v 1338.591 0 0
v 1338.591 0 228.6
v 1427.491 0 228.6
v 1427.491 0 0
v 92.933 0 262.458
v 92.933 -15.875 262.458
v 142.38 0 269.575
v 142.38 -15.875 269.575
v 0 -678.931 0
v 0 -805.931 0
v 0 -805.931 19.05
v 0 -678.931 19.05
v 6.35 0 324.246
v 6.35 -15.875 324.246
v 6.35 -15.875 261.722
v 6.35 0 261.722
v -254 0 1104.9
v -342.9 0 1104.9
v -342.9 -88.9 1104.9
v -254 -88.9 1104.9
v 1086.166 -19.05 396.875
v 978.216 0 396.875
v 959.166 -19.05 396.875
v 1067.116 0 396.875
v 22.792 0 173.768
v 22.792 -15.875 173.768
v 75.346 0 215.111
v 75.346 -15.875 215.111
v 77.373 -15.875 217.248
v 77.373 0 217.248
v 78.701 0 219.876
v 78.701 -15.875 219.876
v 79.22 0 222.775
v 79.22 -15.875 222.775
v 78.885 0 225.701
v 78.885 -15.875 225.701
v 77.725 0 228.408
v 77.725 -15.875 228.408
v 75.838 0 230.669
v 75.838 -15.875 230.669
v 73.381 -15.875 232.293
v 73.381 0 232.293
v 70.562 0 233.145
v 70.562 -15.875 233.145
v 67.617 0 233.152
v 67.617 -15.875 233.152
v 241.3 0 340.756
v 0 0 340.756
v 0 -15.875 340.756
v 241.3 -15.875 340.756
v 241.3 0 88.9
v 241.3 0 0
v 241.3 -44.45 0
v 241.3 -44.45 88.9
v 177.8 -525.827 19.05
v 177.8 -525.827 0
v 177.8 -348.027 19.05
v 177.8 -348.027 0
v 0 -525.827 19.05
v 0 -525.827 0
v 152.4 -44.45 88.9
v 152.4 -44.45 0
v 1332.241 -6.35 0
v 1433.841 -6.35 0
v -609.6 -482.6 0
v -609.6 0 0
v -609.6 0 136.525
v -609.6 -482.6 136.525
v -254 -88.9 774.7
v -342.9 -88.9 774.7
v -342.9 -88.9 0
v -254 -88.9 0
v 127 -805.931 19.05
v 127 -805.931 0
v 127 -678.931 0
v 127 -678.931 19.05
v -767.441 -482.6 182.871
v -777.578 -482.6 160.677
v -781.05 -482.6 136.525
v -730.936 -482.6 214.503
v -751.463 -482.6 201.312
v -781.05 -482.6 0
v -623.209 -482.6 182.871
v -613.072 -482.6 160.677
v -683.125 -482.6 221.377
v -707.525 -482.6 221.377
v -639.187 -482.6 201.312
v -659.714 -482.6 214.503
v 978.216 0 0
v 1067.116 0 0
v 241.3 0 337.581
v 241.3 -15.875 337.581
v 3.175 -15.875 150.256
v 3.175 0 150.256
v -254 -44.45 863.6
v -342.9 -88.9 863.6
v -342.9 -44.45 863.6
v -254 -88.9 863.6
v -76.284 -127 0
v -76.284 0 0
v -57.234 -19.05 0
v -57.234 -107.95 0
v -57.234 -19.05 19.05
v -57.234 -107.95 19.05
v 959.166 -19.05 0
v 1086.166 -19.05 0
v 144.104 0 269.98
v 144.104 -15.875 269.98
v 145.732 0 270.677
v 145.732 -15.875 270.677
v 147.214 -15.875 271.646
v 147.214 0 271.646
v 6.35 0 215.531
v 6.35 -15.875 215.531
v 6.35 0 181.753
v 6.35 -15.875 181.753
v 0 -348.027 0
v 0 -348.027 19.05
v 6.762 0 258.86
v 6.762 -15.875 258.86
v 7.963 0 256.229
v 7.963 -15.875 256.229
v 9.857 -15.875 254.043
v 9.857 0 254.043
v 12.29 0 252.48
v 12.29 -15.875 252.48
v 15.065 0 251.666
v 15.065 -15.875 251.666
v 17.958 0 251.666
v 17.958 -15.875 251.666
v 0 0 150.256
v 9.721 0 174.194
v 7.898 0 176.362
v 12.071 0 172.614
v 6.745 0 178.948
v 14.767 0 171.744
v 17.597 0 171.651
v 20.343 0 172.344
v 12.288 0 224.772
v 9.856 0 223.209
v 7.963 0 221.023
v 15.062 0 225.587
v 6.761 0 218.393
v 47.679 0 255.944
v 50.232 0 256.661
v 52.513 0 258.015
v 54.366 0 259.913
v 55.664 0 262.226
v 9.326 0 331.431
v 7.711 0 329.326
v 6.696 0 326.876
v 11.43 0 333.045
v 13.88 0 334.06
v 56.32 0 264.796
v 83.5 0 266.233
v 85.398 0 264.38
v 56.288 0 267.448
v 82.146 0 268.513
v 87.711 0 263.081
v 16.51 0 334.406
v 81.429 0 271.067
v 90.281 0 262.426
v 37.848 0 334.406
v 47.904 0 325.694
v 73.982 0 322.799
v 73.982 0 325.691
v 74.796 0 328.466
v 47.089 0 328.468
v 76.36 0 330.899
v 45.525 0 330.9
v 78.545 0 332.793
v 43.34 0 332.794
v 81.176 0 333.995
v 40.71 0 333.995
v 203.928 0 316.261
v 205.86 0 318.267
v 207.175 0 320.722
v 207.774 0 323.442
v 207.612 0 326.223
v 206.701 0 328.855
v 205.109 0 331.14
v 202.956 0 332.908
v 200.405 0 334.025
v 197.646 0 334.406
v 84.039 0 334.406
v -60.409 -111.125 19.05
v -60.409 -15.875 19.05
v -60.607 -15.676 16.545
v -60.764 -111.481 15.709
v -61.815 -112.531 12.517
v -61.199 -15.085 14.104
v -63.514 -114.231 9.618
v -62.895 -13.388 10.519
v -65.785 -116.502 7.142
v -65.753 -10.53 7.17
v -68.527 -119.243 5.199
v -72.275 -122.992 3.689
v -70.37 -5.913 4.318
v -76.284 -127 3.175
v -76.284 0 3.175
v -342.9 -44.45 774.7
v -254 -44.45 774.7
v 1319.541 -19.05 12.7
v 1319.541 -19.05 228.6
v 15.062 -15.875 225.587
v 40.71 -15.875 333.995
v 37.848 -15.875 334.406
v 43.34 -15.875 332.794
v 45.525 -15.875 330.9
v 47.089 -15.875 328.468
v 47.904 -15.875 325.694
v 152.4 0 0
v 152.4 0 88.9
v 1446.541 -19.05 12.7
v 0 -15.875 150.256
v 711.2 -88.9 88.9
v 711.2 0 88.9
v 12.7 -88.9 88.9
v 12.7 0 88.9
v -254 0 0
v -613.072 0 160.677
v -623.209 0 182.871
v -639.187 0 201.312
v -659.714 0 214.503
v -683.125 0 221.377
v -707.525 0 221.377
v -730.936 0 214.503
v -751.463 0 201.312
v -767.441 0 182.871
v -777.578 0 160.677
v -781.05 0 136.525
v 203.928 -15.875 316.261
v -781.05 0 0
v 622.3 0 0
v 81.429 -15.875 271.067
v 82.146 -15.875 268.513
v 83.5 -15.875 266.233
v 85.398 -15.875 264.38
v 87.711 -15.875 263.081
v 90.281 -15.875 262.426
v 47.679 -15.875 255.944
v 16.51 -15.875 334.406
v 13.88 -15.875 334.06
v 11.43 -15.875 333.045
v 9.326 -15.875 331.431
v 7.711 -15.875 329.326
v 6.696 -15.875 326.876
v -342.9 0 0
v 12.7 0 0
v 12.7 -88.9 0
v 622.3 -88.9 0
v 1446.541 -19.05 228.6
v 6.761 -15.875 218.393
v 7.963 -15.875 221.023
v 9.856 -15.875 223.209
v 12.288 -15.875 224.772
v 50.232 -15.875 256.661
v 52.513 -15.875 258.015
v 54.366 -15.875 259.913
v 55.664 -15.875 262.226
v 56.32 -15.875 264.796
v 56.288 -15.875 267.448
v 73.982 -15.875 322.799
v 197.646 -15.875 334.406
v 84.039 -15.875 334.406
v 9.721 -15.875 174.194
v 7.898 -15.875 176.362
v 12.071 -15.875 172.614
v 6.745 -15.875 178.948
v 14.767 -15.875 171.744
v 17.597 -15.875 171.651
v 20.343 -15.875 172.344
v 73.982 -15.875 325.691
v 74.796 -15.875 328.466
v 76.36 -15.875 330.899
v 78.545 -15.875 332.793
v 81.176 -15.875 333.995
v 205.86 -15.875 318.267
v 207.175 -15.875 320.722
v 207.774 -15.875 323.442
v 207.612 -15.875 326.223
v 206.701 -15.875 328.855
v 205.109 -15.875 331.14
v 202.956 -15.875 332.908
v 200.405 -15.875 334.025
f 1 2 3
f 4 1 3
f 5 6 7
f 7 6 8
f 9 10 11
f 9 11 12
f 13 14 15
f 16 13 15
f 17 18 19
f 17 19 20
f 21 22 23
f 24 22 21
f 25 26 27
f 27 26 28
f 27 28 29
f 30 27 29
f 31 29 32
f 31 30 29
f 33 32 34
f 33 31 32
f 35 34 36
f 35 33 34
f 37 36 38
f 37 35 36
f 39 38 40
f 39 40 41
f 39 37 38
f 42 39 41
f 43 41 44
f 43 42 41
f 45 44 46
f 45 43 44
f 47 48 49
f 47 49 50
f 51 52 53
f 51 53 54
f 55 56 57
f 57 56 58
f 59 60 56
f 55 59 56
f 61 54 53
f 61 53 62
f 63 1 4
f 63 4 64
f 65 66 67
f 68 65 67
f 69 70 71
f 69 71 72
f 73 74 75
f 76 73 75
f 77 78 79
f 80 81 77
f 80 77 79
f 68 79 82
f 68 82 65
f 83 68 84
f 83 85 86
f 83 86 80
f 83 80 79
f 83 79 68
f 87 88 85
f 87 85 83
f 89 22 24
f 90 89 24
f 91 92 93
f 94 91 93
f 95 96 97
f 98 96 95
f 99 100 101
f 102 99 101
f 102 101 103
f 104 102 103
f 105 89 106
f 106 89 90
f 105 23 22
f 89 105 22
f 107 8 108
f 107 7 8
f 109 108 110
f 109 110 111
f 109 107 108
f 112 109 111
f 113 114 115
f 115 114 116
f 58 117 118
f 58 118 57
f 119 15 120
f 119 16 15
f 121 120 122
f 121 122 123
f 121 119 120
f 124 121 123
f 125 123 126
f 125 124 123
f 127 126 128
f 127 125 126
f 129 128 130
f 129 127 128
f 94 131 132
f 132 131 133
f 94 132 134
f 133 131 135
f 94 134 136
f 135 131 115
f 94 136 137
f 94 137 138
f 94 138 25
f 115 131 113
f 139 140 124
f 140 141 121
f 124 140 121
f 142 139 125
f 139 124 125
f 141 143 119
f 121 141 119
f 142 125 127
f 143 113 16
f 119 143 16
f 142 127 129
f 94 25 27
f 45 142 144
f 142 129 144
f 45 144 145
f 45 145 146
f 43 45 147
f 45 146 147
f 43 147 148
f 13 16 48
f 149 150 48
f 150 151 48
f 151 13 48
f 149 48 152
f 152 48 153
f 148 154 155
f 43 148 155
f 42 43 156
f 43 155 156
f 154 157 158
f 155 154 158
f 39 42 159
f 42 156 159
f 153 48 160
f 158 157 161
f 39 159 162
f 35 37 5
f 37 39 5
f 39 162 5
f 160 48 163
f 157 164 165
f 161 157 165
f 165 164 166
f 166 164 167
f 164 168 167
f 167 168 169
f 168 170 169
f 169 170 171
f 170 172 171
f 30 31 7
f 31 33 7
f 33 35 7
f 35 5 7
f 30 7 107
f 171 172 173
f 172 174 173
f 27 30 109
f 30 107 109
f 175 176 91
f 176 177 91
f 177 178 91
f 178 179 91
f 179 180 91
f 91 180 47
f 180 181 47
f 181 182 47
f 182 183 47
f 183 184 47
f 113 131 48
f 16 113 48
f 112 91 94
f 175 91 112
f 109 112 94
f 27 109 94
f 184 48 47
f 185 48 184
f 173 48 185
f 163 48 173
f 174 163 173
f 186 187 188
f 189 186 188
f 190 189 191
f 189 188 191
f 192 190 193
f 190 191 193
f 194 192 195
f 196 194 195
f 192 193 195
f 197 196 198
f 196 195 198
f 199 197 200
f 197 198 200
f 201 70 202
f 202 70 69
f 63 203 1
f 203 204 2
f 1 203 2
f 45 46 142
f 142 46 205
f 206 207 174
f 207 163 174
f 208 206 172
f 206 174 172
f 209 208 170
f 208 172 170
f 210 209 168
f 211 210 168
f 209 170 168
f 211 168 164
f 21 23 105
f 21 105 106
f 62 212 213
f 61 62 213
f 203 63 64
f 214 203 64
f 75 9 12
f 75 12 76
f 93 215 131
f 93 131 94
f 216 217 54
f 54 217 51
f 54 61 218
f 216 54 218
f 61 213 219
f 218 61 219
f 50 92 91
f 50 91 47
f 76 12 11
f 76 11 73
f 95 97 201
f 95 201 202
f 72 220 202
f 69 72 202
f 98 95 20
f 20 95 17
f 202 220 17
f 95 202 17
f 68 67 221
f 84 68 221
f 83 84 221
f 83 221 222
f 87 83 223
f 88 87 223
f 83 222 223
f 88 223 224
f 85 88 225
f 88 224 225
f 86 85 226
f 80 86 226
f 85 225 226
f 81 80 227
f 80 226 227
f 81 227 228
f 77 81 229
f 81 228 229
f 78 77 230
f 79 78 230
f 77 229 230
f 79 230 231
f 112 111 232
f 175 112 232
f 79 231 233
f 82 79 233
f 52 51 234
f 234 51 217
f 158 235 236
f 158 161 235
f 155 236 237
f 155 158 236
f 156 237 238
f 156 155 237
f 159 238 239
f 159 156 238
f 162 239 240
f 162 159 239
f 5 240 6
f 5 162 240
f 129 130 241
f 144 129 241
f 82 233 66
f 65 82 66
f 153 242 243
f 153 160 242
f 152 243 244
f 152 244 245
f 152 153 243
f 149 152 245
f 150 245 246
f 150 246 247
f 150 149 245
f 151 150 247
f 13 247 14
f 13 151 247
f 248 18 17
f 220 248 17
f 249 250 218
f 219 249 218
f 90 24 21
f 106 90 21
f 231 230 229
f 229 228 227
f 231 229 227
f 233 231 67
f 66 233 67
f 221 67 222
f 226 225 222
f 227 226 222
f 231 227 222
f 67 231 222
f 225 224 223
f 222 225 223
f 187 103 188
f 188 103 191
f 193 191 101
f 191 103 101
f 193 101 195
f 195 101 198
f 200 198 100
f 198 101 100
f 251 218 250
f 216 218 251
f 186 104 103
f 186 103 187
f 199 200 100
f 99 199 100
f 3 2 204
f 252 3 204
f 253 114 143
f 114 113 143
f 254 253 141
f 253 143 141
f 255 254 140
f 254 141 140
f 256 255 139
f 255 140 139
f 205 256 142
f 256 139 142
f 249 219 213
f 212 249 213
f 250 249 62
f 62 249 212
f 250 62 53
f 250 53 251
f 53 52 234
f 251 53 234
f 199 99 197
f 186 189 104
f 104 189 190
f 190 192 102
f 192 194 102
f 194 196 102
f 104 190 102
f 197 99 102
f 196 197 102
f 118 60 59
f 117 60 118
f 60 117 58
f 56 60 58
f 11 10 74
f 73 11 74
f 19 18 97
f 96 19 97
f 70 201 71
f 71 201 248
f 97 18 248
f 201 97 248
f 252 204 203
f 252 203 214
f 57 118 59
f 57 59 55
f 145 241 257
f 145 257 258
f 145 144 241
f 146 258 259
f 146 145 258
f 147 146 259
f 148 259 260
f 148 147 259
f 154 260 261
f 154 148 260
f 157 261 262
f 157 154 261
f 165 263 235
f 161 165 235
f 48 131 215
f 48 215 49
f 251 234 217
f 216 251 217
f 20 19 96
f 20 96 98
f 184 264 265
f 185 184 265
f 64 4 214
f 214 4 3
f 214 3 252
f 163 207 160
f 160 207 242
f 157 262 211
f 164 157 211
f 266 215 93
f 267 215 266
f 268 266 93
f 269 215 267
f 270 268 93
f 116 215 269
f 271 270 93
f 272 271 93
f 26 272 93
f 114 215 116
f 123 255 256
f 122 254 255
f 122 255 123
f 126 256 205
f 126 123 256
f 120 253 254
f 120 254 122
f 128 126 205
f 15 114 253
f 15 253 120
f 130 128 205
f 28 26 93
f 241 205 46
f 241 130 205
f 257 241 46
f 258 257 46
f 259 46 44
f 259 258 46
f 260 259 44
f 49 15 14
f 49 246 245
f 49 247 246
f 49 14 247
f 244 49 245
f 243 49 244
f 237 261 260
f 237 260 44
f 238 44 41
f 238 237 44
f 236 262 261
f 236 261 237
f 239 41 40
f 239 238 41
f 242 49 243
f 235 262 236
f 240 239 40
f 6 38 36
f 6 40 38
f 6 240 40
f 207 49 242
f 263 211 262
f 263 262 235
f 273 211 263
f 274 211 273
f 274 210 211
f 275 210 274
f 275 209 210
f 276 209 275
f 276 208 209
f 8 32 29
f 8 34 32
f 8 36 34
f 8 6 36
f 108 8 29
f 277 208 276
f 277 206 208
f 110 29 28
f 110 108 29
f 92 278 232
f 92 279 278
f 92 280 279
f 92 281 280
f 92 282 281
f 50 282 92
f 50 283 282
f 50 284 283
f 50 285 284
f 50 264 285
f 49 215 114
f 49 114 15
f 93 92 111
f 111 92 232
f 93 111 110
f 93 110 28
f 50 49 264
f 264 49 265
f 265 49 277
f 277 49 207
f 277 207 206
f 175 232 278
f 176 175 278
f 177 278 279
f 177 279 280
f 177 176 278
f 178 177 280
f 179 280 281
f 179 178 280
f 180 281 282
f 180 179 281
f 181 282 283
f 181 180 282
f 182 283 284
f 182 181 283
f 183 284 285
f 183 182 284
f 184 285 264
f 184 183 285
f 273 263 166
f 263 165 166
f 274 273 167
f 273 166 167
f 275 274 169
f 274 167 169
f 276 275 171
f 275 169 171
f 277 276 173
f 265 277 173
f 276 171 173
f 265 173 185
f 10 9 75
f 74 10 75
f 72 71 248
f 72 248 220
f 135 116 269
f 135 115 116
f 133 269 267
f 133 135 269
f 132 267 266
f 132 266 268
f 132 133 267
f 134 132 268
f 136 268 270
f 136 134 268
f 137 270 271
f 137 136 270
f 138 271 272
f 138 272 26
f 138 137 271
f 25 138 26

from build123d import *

# Parameters (mm, degrees)
F1_DEPTH  = 482.6
F3_DEPTH  = 88.9
F4_W      = 88.9
F4_H      = 88.9
F5_DEPTH  = 44.45
F7_DEPTH  = 88.9
F8_W      = 88.9
F8_H      = 88.9
F9_DEPTH  = 44.45
F11_DEPTH = 88.9
F12_W     = 88.9
F12_H     = 95.25
F13_DEPTH = 88.9
F15_DEPTH = 88.9
F17_W     = 127
F17_H     = 396.875
F18_DEPTH = 19.05
F20_DEPTH = 396.876
F21_W     = 127
F21_H     = 228.6
F22_DEPTH = 19.05
F24_DEPTH = 228.601
F26_DEPTH = 127
F28_DEPTH = 1104.901
F29_W     = 177.8
F29_H     = 177.8
F30_DEPTH = 19.05
F31_W     = 127
F31_H     = 127
F32_DEPTH = 19.05
F33_W     = 241.3
F33_H     = 190.5
F34_DEPTH = 15.875
F36_DEPTH = 15.876
F38_DEPTH = 15.876
F39_R     = 10.16
F40_SIZE  = 12.7


with BuildPart() as f1:
    # F0 (on Front) → F1 (new body)
    with BuildSketch(Plane.XZ):
        with BuildLine():
            Line((-781.05, 136.525), (-781.05, 0))
            Line((-781.05, 0), (-609.6, 0))
            Line((-609.6, 0), (-609.6, 136.525))
            ThreePointArc((-609.6, 136.525), (-695.325, 222.25), (-781.05, 136.525))
        make_face()
    extrude(amount=F1_DEPTH)


with BuildPart() as f3:
    # F2 (on Front) → F3 (new body)
    with BuildSketch(Plane.XZ):
        Polygon((-342.9, 1104.9), (-342.9, 0), (-254, 0), (-254, 1193.8), align=None)
    extrude(amount=F3_DEPTH)

    # F4 (on face) → F5 (cut)
    with BuildSketch(Plane.XZ.offset(88.9)):
        with Locations((-298.45, 819.15)):
            Rectangle(F4_W, F4_H)
    extrude(amount=-F5_DEPTH, mode=Mode.SUBTRACT)

    # F12 (on face) → F13 (cut)
    with BuildSketch(Plane.XZ.offset(88.9)):
        with Locations((-298.45, 1152.525)):
            Rectangle(F12_W, F12_H)
    extrude(amount=-F13_DEPTH, mode=Mode.SUBTRACT)


with BuildPart() as f7:
    # F6 (on Front) → F7 (new body)
    with BuildSketch(Plane.XZ):
        Polygon((12.7, 88.9), (-76.2, 0), (622.3, 0), (711.2, 88.9), align=None)
    extrude(amount=F7_DEPTH)

    # F8 (on face) → F9 (cut)
    with BuildSketch(Plane(origin=(0, 0, 0), x_dir=(-1, 0, 0), z_dir=(0, 1, 0))):
        with Locations((-196.85, 44.45)):
            Rectangle(F8_W, F8_H)
    extrude(amount=-F9_DEPTH, mode=Mode.SUBTRACT)

    # F14 (on face) → F15 (cut)
    with BuildSketch(Plane.XZ.offset(88.9)):
        Polygon((-76.2, 0), (12.7, 88.9), (-82.55, 88.9), (-82.55, 0), align=None)
        Polygon((12.7, 0), (12.7, 88.9), (-76.2, 0), align=None)
    extrude(amount=-F15_DEPTH, mode=Mode.SUBTRACT)


with BuildPart() as f11:
    # F10 (on Front) → F11 (new body)
    with BuildSketch(Plane.XZ):
        Polygon((977.993183, 88.9), (889.093183, 0), (1231.993183, 0), (1143.093183, 88.9), align=None)
    extrude(amount=F11_DEPTH)


with BuildPart() as f18:
    # F17 (on Front) → F18 (new body)
    with BuildSketch(Plane.XZ):
        with Locations((1022.666318, 198.4375)):
            Rectangle(F17_W, F17_H)
    extrude(amount=F18_DEPTH)

    # F19 (on face) → F20 (cut, through all)
    with BuildSketch(Plane.XY.offset(396.875)):
        Polygon((959.166318, 0), (959.166318, -19.05), (978.216318, 0), align=None)
        Polygon((1067.116318, 0), (1086.166318, -19.05), (1086.166318, 0), align=None)
    extrude(amount=-F20_DEPTH, mode=Mode.SUBTRACT)


with BuildPart() as f22:
    # F21 (on Front) → F22 (new body)
    with BuildSketch(Plane.XZ):
        with Locations((1383.041433, 114.3)):
            Rectangle(F21_W, F21_H)
    extrude(amount=F22_DEPTH)

    # F23 (on face) → F24 (cut, through all)
    with BuildSketch(Plane.XY.offset(228.6)):
        Polygon((1427.491433, 0), (1446.541433, -19.05), (1446.541433, 0), align=None)
        Polygon((1319.541433, 0), (1319.541433, -19.05), (1338.591433, 0), align=None)
    extrude(amount=-F24_DEPTH, mode=Mode.SUBTRACT)

    # F40
    f40_edges = [f22.edges().sort_by_distance(p)[0] for p in [
        (1383.041433, -19.05, 0),
    ]]
    chamfer(f40_edges, length=F40_SIZE)


with BuildPart() as f26:
    # F25 (on Front) → F26 (new body)
    with BuildSketch(Plane.XZ):
        with BuildLine():
            Line((-76.283529, 0), (-57.233529, 0))
            Line((-57.233529, 0), (-57.233529, 19.05))
            Line((-57.233529, 19.05), (-60.408529, 19.05))
            ThreePointArc((-60.408529, 19.05), (-65.058209, 7.82468), (-76.283529, 3.175))
            Line((-76.283529, 3.175), (-76.283529, 0))
        make_face()
    extrude(amount=F26_DEPTH)

    # F27 (on face) → F28 (cut, through all)
    with BuildSketch(Plane(origin=(0, 0, 0), x_dir=(1, 0, 0), z_dir=(0, 0, -1))):
        Polygon((-57.233529, 19.05), (-76.283529, 0), (-57.233529, 0), align=None)
        Polygon((-57.233529, 127), (-76.283529, 127), (-57.233529, 107.95), align=None)
    extrude(amount=-F28_DEPTH, mode=Mode.SUBTRACT)


with BuildPart() as f30:
    # F29 (on Top) → F30 (new body)
    with BuildSketch(Plane.XY):
        with Locations((88.9, -436.926965)):
            Rectangle(F29_W, F29_H)
    extrude(amount=F30_DEPTH)


with BuildPart() as f32:
    # F31 (on Top) → F32 (new body)
    with BuildSketch(Plane.XY):
        with Locations((63.5, -742.43113)):
            Rectangle(F31_W, F31_H)
    extrude(amount=F32_DEPTH)


with BuildPart() as f34:
    # F33 (on Front) → F34 (new body)
    with BuildSketch(Plane.XZ):
        with Locations((120.65, 245.506336)):
            Rectangle(F33_W, F33_H)
    extrude(amount=F34_DEPTH)

    # F35 (on face) → F36 (cut, through all)
    with BuildSketch(Plane.XZ.offset(15.875)):
        Polygon((241.3, 337.581336), (3.175, 150.256336), (241.3, 150.256336), align=None)
    extrude(amount=-F36_DEPTH, mode=Mode.SUBTRACT)

    # F37 (on face) → F38 (cut, through all)
    with BuildSketch(Plane.XZ.offset(15.875)):
        Polygon((6.35, 224.33335), (6.35, 160.83335), (105.147979, 238.554427), align=None)
        Polygon((46.649801, 334.406336), (6.35, 334.406336), (6.35, 249.995132), (57.735378, 257.391593), align=None)
        Polygon((72.311583, 334.406336), (82.876266, 261.010397), (145.074471, 269.963267), (226.993626, 334.406336), align=None)
    extrude(amount=-F38_DEPTH, mode=Mode.SUBTRACT)

    # F39
    f39_edges = [f34.edges().sort_by_distance(p)[0] for p in [
        (145.074471, -7.9375, 269.963267),
        (82.876266, -7.9375, 261.010397),
        (72.311583, -7.9375, 334.406336),
        (226.993626, -7.9375, 334.406336),
        (46.649801, -7.9375, 334.406336),
        (6.35, -7.9375, 334.406336),
        (6.35, -7.9375, 249.995132),
        (57.735378, -7.9375, 257.391593),
        (105.147979, -7.9375, 238.554427),
        (6.35, -7.9375, 224.33335),
        (6.35, -7.9375, 160.83335),
    ]]
    fillet(f39_edges, radius=F39_R)


solid = Compound([f1.part, f3.part, f7.part, f18.part, f22.part, f26.part, f30.part, f32.part, f34.part])
